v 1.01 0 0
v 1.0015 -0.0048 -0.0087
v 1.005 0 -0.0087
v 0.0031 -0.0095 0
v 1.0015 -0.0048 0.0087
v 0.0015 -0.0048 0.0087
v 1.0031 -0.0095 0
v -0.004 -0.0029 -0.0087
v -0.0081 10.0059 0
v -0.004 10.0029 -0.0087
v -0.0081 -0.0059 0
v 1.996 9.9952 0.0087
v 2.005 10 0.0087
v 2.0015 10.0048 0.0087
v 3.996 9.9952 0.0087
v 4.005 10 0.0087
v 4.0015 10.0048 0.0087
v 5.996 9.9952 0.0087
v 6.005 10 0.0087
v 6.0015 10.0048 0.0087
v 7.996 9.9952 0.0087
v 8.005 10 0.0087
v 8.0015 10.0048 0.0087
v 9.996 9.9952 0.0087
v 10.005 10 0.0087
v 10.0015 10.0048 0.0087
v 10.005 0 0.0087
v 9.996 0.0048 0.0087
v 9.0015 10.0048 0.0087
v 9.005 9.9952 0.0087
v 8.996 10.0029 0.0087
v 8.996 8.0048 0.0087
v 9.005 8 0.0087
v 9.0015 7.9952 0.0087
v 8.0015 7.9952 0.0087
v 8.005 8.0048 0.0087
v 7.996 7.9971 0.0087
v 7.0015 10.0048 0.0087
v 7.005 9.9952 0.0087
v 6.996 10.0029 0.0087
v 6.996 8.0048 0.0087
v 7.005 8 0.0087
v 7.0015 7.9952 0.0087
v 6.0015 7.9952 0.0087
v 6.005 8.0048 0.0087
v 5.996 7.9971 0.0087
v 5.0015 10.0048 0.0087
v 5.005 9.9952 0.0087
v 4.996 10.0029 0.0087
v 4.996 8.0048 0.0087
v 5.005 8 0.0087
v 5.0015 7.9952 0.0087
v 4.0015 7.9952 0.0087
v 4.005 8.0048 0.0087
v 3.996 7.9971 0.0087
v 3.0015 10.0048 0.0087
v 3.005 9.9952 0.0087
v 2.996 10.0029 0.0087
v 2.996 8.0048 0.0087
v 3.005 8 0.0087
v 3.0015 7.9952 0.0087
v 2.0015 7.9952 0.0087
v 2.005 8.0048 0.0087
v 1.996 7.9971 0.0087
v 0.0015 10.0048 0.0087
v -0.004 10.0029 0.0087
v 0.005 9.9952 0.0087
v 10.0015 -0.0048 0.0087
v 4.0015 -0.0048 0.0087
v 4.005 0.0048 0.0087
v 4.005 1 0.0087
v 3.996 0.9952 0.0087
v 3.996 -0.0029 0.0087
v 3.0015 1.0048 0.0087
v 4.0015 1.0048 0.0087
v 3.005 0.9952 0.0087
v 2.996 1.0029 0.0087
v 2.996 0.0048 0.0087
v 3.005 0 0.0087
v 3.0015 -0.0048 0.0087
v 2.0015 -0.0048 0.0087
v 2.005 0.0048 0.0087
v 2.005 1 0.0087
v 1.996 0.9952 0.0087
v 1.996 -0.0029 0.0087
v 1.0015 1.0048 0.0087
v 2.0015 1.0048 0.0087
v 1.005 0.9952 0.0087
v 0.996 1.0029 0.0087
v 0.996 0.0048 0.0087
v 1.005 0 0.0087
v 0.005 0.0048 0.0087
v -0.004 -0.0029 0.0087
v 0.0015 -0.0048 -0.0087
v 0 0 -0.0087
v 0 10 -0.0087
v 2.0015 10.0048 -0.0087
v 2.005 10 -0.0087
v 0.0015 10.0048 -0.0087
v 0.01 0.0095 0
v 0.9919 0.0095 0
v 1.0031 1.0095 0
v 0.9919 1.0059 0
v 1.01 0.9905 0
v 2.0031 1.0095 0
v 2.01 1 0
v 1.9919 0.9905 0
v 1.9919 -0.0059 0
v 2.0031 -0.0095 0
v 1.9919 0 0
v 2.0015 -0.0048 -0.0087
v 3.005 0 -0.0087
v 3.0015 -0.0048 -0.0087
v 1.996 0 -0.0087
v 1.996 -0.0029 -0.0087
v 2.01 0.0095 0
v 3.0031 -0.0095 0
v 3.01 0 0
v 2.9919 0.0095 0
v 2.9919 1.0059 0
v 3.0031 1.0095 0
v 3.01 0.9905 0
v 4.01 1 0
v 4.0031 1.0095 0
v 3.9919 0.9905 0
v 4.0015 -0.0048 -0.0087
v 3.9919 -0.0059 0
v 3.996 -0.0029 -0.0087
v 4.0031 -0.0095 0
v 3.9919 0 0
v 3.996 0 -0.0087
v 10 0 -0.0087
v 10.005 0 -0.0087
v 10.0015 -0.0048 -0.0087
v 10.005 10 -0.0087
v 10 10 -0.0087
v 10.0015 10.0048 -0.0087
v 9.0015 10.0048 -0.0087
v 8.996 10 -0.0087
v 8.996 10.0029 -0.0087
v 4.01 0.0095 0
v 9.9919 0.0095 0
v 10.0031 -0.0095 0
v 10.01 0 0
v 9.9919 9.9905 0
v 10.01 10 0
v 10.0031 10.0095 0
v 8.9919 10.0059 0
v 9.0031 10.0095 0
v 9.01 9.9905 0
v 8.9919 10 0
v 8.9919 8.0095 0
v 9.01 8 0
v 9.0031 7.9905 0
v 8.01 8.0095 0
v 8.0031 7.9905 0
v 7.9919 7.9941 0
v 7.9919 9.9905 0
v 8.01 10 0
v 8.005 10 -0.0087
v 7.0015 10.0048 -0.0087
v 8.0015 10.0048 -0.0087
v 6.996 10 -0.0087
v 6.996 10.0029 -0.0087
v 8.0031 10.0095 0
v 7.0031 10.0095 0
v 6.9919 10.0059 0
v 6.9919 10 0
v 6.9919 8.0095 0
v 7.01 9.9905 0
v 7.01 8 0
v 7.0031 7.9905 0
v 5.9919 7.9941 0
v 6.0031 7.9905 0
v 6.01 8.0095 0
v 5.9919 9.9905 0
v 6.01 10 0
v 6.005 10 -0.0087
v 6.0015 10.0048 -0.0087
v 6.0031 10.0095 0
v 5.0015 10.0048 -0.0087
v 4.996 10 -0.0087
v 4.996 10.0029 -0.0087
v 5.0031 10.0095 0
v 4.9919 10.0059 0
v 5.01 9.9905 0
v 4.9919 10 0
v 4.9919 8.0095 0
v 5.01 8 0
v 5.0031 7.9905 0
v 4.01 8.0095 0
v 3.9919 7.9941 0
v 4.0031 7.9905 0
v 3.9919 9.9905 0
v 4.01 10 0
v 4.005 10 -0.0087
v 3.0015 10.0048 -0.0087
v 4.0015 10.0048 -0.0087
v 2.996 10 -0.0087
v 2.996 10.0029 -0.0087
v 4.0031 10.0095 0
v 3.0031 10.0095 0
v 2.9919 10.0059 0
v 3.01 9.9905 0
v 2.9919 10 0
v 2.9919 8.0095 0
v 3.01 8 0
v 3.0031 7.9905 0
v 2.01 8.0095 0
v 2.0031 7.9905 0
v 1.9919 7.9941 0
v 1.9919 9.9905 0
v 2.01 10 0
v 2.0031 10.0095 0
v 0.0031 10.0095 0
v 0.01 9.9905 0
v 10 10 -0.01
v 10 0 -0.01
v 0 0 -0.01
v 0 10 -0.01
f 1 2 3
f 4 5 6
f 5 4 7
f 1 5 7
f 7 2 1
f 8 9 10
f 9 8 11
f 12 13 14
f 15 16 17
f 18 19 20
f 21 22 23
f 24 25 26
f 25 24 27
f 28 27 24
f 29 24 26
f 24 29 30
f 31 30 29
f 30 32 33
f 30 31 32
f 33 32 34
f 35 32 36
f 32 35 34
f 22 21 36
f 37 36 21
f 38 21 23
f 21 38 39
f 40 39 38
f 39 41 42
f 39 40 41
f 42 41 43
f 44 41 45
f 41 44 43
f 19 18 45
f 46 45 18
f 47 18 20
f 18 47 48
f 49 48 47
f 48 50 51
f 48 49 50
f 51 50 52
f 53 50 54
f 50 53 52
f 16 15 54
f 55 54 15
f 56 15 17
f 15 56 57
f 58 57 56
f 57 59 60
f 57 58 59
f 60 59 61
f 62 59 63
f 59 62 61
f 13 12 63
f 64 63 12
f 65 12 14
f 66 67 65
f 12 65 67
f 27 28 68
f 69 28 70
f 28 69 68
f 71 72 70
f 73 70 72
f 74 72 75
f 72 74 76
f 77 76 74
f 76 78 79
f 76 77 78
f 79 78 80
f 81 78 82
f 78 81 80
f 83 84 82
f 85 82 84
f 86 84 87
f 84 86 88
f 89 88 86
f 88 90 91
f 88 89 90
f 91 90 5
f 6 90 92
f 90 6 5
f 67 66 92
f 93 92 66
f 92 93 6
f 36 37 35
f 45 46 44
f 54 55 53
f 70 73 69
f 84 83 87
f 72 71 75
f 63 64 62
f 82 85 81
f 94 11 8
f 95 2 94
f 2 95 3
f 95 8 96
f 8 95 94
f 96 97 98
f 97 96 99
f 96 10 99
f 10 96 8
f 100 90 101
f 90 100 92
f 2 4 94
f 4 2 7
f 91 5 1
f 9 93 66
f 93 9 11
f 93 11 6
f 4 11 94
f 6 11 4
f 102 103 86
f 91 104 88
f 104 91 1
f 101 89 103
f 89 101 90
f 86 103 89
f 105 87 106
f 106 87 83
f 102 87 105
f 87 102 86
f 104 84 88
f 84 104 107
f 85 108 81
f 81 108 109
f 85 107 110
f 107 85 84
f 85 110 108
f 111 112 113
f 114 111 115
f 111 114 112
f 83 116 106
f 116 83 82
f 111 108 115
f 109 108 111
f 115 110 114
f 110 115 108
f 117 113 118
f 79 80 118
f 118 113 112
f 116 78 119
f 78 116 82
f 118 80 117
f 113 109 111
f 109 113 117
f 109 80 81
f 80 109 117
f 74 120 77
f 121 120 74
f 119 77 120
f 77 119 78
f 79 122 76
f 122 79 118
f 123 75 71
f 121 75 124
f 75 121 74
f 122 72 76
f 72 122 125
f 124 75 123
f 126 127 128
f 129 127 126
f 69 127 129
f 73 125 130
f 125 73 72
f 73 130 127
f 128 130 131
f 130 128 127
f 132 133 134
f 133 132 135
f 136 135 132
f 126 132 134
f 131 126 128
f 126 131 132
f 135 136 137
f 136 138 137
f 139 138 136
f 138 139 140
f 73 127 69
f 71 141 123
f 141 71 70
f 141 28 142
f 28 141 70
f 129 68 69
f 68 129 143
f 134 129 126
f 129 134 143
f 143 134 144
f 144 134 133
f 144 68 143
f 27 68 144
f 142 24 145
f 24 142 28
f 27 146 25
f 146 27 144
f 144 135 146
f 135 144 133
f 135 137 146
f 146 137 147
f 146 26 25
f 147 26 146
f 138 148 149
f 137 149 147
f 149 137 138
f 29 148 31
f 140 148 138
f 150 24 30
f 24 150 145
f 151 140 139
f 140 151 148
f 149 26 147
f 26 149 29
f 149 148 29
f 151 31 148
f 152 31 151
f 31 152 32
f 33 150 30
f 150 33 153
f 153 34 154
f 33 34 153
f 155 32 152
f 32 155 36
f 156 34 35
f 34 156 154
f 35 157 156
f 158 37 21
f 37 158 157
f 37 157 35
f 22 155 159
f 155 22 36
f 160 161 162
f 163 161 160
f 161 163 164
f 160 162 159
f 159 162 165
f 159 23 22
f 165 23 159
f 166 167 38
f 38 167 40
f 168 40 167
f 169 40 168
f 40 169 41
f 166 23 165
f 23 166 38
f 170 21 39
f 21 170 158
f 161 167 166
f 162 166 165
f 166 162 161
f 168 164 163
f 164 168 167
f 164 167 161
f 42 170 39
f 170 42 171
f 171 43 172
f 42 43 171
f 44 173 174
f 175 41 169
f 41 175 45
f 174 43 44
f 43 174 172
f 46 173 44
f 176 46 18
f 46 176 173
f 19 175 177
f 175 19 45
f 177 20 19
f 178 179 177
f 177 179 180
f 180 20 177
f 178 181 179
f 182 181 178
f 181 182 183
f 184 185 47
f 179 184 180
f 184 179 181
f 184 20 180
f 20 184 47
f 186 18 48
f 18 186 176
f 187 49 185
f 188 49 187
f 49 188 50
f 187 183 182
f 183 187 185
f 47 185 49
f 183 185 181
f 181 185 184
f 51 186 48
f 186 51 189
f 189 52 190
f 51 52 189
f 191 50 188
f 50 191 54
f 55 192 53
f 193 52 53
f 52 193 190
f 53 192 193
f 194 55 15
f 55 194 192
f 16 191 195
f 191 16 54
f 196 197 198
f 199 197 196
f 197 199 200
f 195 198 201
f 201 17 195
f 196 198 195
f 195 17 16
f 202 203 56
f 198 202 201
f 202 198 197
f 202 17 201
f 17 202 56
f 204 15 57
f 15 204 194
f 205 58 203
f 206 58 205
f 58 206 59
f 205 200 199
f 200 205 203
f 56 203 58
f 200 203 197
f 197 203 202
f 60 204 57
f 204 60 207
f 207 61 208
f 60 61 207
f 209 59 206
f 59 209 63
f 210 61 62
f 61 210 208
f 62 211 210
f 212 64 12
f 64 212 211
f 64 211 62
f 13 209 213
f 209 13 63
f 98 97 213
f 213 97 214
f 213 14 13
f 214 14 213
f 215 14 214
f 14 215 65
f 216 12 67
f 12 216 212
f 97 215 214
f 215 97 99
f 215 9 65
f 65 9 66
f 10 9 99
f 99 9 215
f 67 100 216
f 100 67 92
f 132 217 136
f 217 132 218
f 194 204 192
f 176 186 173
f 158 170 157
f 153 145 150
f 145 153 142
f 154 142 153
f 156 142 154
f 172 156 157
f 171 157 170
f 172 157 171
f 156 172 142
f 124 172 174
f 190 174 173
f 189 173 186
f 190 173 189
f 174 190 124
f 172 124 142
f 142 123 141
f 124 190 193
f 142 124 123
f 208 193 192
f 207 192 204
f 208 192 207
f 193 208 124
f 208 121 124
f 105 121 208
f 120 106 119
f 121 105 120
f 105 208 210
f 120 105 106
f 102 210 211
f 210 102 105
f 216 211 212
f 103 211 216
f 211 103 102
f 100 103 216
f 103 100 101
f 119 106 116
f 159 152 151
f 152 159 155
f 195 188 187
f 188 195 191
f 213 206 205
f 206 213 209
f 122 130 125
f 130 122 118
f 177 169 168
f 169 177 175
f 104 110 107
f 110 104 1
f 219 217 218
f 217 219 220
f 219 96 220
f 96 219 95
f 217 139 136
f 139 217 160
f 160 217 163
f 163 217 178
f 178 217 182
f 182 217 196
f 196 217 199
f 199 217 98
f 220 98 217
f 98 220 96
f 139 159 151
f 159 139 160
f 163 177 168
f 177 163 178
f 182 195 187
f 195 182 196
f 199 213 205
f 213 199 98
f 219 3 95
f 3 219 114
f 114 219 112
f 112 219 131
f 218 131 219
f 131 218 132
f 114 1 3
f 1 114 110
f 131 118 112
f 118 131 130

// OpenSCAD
hull(){
    translate([0, 0]) sphere(0.01);
    translate([1, 0]) sphere(0.01);
}
hull(){
    translate([1, 0]) sphere(0.01);
    translate([1, 1]) sphere(0.01);
}
hull(){
    translate([1, 1]) sphere(0.01);
    translate([2, 1]) sphere(0.01);
}
hull(){
    translate([2, 1]) sphere(0.01);
    translate([2, 0]) sphere(0.01);
}
hull(){
    translate([2, 0]) sphere(0.01);
    translate([3, 0]) sphere(0.01);
}
hull(){
    translate([3, 0]) sphere(0.01);
    translate([3, 1]) sphere(0.01);
}
hull(){
    translate([3, 1]) sphere(0.01);
    translate([4, 1]) sphere(0.01);
}
hull(){
    translate([4, 1]) sphere(0.01);
    translate([4, 0]) sphere(0.01);
}
hull(){
    translate([4, 0]) sphere(0.01);
    translate([5, 0]) sphere(0.01);
}
hull(){
    translate([5, 0]) sphere(0.01);
    translate([6, 0]) sphere(0.01);
}
hull(){
    translate([6, 0]) sphere(0.01);
    translate([7, 0]) sphere(0.01);
}
hull(){
    translate([7, 0]) sphere(0.01);
    translate([8, 0]) sphere(0.01);
}
hull(){
    translate([8, 0]) sphere(0.01);
    translate([9, 0]) sphere(0.01);
}
hull(){
    translate([9, 0]) sphere(0.01);
    translate([10, 0]) sphere(0.01);
}
hull(){
    translate([10, 0]) sphere(0.01);
    translate([10, 1]) sphere(0.01);
}
hull(){
    translate([10, 1]) sphere(0.01);
    translate([10, 2]) sphere(0.01);
}
hull(){
    translate([10, 2]) sphere(0.01);
    translate([10, 3]) sphere(0.01);
}
hull(){
    translate([10, 3]) sphere(0.01);
    translate([10, 4]) sphere(0.01);
}
hull(){
    translate([10, 4]) sphere(0.01);
    translate([10, 5]) sphere(0.01);
}
hull(){
    translate([10, 5]) sphere(0.01);
    translate([10, 6]) sphere(0.01);
}
hull(){
    translate([10, 6]) sphere(0.01);
    translate([10, 7]) sphere(0.01);
}
hull(){
    translate([10, 7]) sphere(0.01);
    translate([10, 8]) sphere(0.01);
}
hull(){
    translate([10, 8]) sphere(0.01);
    translate([10, 9]) sphere(0.01);
}
hull(){
    translate([10, 9]) sphere(0.01);
    translate([10, 10]) sphere(0.01);
}
hull(){
    translate([10, 10]) sphere(0.01);
    translate([9, 10]) sphere(0.01);
}
hull(){
    translate([9, 10]) sphere(0.01);
    translate([9, 9]) sphere(0.01);
}
hull(){
    translate([9, 9]) sphere(0.01);
    translate([9, 8]) sphere(0.01);
}
hull(){
    translate([9, 8]) sphere(0.01);
    translate([8, 8]) sphere(0.01);
}
hull(){
    translate([8, 8]) sphere(0.01);
    translate([8, 9]) sphere(0.01);
}
hull(){
    translate([8, 9]) sphere(0.01);
    translate([8, 10]) sphere(0.01);
}
hull(){
    translate([8, 10]) sphere(0.01);
    translate([7, 10]) sphere(0.01);
}
hull(){
    translate([7, 10]) sphere(0.01);
    translate([7, 9]) sphere(0.01);
}
hull(){
    translate([7, 9]) sphere(0.01);
    translate([7, 8]) sphere(0.01);
}
hull(){
    translate([7, 8]) sphere(0.01);
    translate([6, 8]) sphere(0.01);
}
hull(){
    translate([6, 8]) sphere(0.01);
    translate([6, 9]) sphere(0.01);
}
hull(){
    translate([6, 9]) sphere(0.01);
    translate([6, 10]) sphere(0.01);
}
hull(){
    translate([6, 10]) sphere(0.01);
    translate([5, 10]) sphere(0.01);
}
hull(){
    translate([5, 10]) sphere(0.01);
    translate([5, 9]) sphere(0.01);
}
hull(){
    translate([5, 9]) sphere(0.01);
    translate([5, 8]) sphere(0.01);
}
hull(){
    translate([5, 8]) sphere(0.01);
    translate([4, 8]) sphere(0.01);
}
hull(){
    translate([4, 8]) sphere(0.01);
    translate([4, 9]) sphere(0.01);
}
hull(){
    translate([4, 9]) sphere(0.01);
    translate([4, 10]) sphere(0.01);
}
hull(){
    translate([4, 10]) sphere(0.01);
    translate([3, 10]) sphere(0.01);
}
hull(){
    translate([3, 10]) sphere(0.01);
    translate([3, 9]) sphere(0.01);
}
hull(){
    translate([3, 9]) sphere(0.01);
    translate([3, 8]) sphere(0.01);
}
hull(){
    translate([3, 8]) sphere(0.01);
    translate([2, 8]) sphere(0.01);
}
hull(){
    translate([2, 8]) sphere(0.01);
    translate([2, 9]) sphere(0.01);
}
hull(){
    translate([2, 9]) sphere(0.01);
    translate([2, 10]) sphere(0.01);
}
hull(){
    translate([2, 10]) sphere(0.01);
    translate([1, 10]) sphere(0.01);
}
hull(){
    translate([1, 10]) sphere(0.01);
    translate([0, 10]) sphere(0.01);
}
hull(){
    translate([0, 10]) sphere(0.01);
    translate([0, 9]) sphere(0.01);
}
hull(){
    translate([0, 9]) sphere(0.01);
    translate([0, 8]) sphere(0.01);
}
hull(){
    translate([0, 8]) sphere(0.01);
    translate([0, 7]) sphere(0.01);
}
hull(){
    translate([0, 7]) sphere(0.01);
    translate([0, 6]) sphere(0.01);
}
hull(){
    translate([0, 6]) sphere(0.01);
    translate([0, 5]) sphere(0.01);
}
hull(){
    translate([0, 5]) sphere(0.01);
    translate([0, 4]) sphere(0.01);
}
hull(){
    translate([0, 4]) sphere(0.01);
    translate([0, 3]) sphere(0.01);
}
hull(){
    translate([0, 3]) sphere(0.01);
    translate([0, 2]) sphere(0.01);
}
hull(){
    translate([0, 2]) sphere(0.01);
    translate([0, 1]) sphere(0.01);
}
hull(){
    translate([0, 1]) sphere(0.01);
    translate([0, 0]) sphere(0.01);
}
translate([0,0,-0.01]) color([0.1,0.1,0.1]) cube([10,10,0.01]);
